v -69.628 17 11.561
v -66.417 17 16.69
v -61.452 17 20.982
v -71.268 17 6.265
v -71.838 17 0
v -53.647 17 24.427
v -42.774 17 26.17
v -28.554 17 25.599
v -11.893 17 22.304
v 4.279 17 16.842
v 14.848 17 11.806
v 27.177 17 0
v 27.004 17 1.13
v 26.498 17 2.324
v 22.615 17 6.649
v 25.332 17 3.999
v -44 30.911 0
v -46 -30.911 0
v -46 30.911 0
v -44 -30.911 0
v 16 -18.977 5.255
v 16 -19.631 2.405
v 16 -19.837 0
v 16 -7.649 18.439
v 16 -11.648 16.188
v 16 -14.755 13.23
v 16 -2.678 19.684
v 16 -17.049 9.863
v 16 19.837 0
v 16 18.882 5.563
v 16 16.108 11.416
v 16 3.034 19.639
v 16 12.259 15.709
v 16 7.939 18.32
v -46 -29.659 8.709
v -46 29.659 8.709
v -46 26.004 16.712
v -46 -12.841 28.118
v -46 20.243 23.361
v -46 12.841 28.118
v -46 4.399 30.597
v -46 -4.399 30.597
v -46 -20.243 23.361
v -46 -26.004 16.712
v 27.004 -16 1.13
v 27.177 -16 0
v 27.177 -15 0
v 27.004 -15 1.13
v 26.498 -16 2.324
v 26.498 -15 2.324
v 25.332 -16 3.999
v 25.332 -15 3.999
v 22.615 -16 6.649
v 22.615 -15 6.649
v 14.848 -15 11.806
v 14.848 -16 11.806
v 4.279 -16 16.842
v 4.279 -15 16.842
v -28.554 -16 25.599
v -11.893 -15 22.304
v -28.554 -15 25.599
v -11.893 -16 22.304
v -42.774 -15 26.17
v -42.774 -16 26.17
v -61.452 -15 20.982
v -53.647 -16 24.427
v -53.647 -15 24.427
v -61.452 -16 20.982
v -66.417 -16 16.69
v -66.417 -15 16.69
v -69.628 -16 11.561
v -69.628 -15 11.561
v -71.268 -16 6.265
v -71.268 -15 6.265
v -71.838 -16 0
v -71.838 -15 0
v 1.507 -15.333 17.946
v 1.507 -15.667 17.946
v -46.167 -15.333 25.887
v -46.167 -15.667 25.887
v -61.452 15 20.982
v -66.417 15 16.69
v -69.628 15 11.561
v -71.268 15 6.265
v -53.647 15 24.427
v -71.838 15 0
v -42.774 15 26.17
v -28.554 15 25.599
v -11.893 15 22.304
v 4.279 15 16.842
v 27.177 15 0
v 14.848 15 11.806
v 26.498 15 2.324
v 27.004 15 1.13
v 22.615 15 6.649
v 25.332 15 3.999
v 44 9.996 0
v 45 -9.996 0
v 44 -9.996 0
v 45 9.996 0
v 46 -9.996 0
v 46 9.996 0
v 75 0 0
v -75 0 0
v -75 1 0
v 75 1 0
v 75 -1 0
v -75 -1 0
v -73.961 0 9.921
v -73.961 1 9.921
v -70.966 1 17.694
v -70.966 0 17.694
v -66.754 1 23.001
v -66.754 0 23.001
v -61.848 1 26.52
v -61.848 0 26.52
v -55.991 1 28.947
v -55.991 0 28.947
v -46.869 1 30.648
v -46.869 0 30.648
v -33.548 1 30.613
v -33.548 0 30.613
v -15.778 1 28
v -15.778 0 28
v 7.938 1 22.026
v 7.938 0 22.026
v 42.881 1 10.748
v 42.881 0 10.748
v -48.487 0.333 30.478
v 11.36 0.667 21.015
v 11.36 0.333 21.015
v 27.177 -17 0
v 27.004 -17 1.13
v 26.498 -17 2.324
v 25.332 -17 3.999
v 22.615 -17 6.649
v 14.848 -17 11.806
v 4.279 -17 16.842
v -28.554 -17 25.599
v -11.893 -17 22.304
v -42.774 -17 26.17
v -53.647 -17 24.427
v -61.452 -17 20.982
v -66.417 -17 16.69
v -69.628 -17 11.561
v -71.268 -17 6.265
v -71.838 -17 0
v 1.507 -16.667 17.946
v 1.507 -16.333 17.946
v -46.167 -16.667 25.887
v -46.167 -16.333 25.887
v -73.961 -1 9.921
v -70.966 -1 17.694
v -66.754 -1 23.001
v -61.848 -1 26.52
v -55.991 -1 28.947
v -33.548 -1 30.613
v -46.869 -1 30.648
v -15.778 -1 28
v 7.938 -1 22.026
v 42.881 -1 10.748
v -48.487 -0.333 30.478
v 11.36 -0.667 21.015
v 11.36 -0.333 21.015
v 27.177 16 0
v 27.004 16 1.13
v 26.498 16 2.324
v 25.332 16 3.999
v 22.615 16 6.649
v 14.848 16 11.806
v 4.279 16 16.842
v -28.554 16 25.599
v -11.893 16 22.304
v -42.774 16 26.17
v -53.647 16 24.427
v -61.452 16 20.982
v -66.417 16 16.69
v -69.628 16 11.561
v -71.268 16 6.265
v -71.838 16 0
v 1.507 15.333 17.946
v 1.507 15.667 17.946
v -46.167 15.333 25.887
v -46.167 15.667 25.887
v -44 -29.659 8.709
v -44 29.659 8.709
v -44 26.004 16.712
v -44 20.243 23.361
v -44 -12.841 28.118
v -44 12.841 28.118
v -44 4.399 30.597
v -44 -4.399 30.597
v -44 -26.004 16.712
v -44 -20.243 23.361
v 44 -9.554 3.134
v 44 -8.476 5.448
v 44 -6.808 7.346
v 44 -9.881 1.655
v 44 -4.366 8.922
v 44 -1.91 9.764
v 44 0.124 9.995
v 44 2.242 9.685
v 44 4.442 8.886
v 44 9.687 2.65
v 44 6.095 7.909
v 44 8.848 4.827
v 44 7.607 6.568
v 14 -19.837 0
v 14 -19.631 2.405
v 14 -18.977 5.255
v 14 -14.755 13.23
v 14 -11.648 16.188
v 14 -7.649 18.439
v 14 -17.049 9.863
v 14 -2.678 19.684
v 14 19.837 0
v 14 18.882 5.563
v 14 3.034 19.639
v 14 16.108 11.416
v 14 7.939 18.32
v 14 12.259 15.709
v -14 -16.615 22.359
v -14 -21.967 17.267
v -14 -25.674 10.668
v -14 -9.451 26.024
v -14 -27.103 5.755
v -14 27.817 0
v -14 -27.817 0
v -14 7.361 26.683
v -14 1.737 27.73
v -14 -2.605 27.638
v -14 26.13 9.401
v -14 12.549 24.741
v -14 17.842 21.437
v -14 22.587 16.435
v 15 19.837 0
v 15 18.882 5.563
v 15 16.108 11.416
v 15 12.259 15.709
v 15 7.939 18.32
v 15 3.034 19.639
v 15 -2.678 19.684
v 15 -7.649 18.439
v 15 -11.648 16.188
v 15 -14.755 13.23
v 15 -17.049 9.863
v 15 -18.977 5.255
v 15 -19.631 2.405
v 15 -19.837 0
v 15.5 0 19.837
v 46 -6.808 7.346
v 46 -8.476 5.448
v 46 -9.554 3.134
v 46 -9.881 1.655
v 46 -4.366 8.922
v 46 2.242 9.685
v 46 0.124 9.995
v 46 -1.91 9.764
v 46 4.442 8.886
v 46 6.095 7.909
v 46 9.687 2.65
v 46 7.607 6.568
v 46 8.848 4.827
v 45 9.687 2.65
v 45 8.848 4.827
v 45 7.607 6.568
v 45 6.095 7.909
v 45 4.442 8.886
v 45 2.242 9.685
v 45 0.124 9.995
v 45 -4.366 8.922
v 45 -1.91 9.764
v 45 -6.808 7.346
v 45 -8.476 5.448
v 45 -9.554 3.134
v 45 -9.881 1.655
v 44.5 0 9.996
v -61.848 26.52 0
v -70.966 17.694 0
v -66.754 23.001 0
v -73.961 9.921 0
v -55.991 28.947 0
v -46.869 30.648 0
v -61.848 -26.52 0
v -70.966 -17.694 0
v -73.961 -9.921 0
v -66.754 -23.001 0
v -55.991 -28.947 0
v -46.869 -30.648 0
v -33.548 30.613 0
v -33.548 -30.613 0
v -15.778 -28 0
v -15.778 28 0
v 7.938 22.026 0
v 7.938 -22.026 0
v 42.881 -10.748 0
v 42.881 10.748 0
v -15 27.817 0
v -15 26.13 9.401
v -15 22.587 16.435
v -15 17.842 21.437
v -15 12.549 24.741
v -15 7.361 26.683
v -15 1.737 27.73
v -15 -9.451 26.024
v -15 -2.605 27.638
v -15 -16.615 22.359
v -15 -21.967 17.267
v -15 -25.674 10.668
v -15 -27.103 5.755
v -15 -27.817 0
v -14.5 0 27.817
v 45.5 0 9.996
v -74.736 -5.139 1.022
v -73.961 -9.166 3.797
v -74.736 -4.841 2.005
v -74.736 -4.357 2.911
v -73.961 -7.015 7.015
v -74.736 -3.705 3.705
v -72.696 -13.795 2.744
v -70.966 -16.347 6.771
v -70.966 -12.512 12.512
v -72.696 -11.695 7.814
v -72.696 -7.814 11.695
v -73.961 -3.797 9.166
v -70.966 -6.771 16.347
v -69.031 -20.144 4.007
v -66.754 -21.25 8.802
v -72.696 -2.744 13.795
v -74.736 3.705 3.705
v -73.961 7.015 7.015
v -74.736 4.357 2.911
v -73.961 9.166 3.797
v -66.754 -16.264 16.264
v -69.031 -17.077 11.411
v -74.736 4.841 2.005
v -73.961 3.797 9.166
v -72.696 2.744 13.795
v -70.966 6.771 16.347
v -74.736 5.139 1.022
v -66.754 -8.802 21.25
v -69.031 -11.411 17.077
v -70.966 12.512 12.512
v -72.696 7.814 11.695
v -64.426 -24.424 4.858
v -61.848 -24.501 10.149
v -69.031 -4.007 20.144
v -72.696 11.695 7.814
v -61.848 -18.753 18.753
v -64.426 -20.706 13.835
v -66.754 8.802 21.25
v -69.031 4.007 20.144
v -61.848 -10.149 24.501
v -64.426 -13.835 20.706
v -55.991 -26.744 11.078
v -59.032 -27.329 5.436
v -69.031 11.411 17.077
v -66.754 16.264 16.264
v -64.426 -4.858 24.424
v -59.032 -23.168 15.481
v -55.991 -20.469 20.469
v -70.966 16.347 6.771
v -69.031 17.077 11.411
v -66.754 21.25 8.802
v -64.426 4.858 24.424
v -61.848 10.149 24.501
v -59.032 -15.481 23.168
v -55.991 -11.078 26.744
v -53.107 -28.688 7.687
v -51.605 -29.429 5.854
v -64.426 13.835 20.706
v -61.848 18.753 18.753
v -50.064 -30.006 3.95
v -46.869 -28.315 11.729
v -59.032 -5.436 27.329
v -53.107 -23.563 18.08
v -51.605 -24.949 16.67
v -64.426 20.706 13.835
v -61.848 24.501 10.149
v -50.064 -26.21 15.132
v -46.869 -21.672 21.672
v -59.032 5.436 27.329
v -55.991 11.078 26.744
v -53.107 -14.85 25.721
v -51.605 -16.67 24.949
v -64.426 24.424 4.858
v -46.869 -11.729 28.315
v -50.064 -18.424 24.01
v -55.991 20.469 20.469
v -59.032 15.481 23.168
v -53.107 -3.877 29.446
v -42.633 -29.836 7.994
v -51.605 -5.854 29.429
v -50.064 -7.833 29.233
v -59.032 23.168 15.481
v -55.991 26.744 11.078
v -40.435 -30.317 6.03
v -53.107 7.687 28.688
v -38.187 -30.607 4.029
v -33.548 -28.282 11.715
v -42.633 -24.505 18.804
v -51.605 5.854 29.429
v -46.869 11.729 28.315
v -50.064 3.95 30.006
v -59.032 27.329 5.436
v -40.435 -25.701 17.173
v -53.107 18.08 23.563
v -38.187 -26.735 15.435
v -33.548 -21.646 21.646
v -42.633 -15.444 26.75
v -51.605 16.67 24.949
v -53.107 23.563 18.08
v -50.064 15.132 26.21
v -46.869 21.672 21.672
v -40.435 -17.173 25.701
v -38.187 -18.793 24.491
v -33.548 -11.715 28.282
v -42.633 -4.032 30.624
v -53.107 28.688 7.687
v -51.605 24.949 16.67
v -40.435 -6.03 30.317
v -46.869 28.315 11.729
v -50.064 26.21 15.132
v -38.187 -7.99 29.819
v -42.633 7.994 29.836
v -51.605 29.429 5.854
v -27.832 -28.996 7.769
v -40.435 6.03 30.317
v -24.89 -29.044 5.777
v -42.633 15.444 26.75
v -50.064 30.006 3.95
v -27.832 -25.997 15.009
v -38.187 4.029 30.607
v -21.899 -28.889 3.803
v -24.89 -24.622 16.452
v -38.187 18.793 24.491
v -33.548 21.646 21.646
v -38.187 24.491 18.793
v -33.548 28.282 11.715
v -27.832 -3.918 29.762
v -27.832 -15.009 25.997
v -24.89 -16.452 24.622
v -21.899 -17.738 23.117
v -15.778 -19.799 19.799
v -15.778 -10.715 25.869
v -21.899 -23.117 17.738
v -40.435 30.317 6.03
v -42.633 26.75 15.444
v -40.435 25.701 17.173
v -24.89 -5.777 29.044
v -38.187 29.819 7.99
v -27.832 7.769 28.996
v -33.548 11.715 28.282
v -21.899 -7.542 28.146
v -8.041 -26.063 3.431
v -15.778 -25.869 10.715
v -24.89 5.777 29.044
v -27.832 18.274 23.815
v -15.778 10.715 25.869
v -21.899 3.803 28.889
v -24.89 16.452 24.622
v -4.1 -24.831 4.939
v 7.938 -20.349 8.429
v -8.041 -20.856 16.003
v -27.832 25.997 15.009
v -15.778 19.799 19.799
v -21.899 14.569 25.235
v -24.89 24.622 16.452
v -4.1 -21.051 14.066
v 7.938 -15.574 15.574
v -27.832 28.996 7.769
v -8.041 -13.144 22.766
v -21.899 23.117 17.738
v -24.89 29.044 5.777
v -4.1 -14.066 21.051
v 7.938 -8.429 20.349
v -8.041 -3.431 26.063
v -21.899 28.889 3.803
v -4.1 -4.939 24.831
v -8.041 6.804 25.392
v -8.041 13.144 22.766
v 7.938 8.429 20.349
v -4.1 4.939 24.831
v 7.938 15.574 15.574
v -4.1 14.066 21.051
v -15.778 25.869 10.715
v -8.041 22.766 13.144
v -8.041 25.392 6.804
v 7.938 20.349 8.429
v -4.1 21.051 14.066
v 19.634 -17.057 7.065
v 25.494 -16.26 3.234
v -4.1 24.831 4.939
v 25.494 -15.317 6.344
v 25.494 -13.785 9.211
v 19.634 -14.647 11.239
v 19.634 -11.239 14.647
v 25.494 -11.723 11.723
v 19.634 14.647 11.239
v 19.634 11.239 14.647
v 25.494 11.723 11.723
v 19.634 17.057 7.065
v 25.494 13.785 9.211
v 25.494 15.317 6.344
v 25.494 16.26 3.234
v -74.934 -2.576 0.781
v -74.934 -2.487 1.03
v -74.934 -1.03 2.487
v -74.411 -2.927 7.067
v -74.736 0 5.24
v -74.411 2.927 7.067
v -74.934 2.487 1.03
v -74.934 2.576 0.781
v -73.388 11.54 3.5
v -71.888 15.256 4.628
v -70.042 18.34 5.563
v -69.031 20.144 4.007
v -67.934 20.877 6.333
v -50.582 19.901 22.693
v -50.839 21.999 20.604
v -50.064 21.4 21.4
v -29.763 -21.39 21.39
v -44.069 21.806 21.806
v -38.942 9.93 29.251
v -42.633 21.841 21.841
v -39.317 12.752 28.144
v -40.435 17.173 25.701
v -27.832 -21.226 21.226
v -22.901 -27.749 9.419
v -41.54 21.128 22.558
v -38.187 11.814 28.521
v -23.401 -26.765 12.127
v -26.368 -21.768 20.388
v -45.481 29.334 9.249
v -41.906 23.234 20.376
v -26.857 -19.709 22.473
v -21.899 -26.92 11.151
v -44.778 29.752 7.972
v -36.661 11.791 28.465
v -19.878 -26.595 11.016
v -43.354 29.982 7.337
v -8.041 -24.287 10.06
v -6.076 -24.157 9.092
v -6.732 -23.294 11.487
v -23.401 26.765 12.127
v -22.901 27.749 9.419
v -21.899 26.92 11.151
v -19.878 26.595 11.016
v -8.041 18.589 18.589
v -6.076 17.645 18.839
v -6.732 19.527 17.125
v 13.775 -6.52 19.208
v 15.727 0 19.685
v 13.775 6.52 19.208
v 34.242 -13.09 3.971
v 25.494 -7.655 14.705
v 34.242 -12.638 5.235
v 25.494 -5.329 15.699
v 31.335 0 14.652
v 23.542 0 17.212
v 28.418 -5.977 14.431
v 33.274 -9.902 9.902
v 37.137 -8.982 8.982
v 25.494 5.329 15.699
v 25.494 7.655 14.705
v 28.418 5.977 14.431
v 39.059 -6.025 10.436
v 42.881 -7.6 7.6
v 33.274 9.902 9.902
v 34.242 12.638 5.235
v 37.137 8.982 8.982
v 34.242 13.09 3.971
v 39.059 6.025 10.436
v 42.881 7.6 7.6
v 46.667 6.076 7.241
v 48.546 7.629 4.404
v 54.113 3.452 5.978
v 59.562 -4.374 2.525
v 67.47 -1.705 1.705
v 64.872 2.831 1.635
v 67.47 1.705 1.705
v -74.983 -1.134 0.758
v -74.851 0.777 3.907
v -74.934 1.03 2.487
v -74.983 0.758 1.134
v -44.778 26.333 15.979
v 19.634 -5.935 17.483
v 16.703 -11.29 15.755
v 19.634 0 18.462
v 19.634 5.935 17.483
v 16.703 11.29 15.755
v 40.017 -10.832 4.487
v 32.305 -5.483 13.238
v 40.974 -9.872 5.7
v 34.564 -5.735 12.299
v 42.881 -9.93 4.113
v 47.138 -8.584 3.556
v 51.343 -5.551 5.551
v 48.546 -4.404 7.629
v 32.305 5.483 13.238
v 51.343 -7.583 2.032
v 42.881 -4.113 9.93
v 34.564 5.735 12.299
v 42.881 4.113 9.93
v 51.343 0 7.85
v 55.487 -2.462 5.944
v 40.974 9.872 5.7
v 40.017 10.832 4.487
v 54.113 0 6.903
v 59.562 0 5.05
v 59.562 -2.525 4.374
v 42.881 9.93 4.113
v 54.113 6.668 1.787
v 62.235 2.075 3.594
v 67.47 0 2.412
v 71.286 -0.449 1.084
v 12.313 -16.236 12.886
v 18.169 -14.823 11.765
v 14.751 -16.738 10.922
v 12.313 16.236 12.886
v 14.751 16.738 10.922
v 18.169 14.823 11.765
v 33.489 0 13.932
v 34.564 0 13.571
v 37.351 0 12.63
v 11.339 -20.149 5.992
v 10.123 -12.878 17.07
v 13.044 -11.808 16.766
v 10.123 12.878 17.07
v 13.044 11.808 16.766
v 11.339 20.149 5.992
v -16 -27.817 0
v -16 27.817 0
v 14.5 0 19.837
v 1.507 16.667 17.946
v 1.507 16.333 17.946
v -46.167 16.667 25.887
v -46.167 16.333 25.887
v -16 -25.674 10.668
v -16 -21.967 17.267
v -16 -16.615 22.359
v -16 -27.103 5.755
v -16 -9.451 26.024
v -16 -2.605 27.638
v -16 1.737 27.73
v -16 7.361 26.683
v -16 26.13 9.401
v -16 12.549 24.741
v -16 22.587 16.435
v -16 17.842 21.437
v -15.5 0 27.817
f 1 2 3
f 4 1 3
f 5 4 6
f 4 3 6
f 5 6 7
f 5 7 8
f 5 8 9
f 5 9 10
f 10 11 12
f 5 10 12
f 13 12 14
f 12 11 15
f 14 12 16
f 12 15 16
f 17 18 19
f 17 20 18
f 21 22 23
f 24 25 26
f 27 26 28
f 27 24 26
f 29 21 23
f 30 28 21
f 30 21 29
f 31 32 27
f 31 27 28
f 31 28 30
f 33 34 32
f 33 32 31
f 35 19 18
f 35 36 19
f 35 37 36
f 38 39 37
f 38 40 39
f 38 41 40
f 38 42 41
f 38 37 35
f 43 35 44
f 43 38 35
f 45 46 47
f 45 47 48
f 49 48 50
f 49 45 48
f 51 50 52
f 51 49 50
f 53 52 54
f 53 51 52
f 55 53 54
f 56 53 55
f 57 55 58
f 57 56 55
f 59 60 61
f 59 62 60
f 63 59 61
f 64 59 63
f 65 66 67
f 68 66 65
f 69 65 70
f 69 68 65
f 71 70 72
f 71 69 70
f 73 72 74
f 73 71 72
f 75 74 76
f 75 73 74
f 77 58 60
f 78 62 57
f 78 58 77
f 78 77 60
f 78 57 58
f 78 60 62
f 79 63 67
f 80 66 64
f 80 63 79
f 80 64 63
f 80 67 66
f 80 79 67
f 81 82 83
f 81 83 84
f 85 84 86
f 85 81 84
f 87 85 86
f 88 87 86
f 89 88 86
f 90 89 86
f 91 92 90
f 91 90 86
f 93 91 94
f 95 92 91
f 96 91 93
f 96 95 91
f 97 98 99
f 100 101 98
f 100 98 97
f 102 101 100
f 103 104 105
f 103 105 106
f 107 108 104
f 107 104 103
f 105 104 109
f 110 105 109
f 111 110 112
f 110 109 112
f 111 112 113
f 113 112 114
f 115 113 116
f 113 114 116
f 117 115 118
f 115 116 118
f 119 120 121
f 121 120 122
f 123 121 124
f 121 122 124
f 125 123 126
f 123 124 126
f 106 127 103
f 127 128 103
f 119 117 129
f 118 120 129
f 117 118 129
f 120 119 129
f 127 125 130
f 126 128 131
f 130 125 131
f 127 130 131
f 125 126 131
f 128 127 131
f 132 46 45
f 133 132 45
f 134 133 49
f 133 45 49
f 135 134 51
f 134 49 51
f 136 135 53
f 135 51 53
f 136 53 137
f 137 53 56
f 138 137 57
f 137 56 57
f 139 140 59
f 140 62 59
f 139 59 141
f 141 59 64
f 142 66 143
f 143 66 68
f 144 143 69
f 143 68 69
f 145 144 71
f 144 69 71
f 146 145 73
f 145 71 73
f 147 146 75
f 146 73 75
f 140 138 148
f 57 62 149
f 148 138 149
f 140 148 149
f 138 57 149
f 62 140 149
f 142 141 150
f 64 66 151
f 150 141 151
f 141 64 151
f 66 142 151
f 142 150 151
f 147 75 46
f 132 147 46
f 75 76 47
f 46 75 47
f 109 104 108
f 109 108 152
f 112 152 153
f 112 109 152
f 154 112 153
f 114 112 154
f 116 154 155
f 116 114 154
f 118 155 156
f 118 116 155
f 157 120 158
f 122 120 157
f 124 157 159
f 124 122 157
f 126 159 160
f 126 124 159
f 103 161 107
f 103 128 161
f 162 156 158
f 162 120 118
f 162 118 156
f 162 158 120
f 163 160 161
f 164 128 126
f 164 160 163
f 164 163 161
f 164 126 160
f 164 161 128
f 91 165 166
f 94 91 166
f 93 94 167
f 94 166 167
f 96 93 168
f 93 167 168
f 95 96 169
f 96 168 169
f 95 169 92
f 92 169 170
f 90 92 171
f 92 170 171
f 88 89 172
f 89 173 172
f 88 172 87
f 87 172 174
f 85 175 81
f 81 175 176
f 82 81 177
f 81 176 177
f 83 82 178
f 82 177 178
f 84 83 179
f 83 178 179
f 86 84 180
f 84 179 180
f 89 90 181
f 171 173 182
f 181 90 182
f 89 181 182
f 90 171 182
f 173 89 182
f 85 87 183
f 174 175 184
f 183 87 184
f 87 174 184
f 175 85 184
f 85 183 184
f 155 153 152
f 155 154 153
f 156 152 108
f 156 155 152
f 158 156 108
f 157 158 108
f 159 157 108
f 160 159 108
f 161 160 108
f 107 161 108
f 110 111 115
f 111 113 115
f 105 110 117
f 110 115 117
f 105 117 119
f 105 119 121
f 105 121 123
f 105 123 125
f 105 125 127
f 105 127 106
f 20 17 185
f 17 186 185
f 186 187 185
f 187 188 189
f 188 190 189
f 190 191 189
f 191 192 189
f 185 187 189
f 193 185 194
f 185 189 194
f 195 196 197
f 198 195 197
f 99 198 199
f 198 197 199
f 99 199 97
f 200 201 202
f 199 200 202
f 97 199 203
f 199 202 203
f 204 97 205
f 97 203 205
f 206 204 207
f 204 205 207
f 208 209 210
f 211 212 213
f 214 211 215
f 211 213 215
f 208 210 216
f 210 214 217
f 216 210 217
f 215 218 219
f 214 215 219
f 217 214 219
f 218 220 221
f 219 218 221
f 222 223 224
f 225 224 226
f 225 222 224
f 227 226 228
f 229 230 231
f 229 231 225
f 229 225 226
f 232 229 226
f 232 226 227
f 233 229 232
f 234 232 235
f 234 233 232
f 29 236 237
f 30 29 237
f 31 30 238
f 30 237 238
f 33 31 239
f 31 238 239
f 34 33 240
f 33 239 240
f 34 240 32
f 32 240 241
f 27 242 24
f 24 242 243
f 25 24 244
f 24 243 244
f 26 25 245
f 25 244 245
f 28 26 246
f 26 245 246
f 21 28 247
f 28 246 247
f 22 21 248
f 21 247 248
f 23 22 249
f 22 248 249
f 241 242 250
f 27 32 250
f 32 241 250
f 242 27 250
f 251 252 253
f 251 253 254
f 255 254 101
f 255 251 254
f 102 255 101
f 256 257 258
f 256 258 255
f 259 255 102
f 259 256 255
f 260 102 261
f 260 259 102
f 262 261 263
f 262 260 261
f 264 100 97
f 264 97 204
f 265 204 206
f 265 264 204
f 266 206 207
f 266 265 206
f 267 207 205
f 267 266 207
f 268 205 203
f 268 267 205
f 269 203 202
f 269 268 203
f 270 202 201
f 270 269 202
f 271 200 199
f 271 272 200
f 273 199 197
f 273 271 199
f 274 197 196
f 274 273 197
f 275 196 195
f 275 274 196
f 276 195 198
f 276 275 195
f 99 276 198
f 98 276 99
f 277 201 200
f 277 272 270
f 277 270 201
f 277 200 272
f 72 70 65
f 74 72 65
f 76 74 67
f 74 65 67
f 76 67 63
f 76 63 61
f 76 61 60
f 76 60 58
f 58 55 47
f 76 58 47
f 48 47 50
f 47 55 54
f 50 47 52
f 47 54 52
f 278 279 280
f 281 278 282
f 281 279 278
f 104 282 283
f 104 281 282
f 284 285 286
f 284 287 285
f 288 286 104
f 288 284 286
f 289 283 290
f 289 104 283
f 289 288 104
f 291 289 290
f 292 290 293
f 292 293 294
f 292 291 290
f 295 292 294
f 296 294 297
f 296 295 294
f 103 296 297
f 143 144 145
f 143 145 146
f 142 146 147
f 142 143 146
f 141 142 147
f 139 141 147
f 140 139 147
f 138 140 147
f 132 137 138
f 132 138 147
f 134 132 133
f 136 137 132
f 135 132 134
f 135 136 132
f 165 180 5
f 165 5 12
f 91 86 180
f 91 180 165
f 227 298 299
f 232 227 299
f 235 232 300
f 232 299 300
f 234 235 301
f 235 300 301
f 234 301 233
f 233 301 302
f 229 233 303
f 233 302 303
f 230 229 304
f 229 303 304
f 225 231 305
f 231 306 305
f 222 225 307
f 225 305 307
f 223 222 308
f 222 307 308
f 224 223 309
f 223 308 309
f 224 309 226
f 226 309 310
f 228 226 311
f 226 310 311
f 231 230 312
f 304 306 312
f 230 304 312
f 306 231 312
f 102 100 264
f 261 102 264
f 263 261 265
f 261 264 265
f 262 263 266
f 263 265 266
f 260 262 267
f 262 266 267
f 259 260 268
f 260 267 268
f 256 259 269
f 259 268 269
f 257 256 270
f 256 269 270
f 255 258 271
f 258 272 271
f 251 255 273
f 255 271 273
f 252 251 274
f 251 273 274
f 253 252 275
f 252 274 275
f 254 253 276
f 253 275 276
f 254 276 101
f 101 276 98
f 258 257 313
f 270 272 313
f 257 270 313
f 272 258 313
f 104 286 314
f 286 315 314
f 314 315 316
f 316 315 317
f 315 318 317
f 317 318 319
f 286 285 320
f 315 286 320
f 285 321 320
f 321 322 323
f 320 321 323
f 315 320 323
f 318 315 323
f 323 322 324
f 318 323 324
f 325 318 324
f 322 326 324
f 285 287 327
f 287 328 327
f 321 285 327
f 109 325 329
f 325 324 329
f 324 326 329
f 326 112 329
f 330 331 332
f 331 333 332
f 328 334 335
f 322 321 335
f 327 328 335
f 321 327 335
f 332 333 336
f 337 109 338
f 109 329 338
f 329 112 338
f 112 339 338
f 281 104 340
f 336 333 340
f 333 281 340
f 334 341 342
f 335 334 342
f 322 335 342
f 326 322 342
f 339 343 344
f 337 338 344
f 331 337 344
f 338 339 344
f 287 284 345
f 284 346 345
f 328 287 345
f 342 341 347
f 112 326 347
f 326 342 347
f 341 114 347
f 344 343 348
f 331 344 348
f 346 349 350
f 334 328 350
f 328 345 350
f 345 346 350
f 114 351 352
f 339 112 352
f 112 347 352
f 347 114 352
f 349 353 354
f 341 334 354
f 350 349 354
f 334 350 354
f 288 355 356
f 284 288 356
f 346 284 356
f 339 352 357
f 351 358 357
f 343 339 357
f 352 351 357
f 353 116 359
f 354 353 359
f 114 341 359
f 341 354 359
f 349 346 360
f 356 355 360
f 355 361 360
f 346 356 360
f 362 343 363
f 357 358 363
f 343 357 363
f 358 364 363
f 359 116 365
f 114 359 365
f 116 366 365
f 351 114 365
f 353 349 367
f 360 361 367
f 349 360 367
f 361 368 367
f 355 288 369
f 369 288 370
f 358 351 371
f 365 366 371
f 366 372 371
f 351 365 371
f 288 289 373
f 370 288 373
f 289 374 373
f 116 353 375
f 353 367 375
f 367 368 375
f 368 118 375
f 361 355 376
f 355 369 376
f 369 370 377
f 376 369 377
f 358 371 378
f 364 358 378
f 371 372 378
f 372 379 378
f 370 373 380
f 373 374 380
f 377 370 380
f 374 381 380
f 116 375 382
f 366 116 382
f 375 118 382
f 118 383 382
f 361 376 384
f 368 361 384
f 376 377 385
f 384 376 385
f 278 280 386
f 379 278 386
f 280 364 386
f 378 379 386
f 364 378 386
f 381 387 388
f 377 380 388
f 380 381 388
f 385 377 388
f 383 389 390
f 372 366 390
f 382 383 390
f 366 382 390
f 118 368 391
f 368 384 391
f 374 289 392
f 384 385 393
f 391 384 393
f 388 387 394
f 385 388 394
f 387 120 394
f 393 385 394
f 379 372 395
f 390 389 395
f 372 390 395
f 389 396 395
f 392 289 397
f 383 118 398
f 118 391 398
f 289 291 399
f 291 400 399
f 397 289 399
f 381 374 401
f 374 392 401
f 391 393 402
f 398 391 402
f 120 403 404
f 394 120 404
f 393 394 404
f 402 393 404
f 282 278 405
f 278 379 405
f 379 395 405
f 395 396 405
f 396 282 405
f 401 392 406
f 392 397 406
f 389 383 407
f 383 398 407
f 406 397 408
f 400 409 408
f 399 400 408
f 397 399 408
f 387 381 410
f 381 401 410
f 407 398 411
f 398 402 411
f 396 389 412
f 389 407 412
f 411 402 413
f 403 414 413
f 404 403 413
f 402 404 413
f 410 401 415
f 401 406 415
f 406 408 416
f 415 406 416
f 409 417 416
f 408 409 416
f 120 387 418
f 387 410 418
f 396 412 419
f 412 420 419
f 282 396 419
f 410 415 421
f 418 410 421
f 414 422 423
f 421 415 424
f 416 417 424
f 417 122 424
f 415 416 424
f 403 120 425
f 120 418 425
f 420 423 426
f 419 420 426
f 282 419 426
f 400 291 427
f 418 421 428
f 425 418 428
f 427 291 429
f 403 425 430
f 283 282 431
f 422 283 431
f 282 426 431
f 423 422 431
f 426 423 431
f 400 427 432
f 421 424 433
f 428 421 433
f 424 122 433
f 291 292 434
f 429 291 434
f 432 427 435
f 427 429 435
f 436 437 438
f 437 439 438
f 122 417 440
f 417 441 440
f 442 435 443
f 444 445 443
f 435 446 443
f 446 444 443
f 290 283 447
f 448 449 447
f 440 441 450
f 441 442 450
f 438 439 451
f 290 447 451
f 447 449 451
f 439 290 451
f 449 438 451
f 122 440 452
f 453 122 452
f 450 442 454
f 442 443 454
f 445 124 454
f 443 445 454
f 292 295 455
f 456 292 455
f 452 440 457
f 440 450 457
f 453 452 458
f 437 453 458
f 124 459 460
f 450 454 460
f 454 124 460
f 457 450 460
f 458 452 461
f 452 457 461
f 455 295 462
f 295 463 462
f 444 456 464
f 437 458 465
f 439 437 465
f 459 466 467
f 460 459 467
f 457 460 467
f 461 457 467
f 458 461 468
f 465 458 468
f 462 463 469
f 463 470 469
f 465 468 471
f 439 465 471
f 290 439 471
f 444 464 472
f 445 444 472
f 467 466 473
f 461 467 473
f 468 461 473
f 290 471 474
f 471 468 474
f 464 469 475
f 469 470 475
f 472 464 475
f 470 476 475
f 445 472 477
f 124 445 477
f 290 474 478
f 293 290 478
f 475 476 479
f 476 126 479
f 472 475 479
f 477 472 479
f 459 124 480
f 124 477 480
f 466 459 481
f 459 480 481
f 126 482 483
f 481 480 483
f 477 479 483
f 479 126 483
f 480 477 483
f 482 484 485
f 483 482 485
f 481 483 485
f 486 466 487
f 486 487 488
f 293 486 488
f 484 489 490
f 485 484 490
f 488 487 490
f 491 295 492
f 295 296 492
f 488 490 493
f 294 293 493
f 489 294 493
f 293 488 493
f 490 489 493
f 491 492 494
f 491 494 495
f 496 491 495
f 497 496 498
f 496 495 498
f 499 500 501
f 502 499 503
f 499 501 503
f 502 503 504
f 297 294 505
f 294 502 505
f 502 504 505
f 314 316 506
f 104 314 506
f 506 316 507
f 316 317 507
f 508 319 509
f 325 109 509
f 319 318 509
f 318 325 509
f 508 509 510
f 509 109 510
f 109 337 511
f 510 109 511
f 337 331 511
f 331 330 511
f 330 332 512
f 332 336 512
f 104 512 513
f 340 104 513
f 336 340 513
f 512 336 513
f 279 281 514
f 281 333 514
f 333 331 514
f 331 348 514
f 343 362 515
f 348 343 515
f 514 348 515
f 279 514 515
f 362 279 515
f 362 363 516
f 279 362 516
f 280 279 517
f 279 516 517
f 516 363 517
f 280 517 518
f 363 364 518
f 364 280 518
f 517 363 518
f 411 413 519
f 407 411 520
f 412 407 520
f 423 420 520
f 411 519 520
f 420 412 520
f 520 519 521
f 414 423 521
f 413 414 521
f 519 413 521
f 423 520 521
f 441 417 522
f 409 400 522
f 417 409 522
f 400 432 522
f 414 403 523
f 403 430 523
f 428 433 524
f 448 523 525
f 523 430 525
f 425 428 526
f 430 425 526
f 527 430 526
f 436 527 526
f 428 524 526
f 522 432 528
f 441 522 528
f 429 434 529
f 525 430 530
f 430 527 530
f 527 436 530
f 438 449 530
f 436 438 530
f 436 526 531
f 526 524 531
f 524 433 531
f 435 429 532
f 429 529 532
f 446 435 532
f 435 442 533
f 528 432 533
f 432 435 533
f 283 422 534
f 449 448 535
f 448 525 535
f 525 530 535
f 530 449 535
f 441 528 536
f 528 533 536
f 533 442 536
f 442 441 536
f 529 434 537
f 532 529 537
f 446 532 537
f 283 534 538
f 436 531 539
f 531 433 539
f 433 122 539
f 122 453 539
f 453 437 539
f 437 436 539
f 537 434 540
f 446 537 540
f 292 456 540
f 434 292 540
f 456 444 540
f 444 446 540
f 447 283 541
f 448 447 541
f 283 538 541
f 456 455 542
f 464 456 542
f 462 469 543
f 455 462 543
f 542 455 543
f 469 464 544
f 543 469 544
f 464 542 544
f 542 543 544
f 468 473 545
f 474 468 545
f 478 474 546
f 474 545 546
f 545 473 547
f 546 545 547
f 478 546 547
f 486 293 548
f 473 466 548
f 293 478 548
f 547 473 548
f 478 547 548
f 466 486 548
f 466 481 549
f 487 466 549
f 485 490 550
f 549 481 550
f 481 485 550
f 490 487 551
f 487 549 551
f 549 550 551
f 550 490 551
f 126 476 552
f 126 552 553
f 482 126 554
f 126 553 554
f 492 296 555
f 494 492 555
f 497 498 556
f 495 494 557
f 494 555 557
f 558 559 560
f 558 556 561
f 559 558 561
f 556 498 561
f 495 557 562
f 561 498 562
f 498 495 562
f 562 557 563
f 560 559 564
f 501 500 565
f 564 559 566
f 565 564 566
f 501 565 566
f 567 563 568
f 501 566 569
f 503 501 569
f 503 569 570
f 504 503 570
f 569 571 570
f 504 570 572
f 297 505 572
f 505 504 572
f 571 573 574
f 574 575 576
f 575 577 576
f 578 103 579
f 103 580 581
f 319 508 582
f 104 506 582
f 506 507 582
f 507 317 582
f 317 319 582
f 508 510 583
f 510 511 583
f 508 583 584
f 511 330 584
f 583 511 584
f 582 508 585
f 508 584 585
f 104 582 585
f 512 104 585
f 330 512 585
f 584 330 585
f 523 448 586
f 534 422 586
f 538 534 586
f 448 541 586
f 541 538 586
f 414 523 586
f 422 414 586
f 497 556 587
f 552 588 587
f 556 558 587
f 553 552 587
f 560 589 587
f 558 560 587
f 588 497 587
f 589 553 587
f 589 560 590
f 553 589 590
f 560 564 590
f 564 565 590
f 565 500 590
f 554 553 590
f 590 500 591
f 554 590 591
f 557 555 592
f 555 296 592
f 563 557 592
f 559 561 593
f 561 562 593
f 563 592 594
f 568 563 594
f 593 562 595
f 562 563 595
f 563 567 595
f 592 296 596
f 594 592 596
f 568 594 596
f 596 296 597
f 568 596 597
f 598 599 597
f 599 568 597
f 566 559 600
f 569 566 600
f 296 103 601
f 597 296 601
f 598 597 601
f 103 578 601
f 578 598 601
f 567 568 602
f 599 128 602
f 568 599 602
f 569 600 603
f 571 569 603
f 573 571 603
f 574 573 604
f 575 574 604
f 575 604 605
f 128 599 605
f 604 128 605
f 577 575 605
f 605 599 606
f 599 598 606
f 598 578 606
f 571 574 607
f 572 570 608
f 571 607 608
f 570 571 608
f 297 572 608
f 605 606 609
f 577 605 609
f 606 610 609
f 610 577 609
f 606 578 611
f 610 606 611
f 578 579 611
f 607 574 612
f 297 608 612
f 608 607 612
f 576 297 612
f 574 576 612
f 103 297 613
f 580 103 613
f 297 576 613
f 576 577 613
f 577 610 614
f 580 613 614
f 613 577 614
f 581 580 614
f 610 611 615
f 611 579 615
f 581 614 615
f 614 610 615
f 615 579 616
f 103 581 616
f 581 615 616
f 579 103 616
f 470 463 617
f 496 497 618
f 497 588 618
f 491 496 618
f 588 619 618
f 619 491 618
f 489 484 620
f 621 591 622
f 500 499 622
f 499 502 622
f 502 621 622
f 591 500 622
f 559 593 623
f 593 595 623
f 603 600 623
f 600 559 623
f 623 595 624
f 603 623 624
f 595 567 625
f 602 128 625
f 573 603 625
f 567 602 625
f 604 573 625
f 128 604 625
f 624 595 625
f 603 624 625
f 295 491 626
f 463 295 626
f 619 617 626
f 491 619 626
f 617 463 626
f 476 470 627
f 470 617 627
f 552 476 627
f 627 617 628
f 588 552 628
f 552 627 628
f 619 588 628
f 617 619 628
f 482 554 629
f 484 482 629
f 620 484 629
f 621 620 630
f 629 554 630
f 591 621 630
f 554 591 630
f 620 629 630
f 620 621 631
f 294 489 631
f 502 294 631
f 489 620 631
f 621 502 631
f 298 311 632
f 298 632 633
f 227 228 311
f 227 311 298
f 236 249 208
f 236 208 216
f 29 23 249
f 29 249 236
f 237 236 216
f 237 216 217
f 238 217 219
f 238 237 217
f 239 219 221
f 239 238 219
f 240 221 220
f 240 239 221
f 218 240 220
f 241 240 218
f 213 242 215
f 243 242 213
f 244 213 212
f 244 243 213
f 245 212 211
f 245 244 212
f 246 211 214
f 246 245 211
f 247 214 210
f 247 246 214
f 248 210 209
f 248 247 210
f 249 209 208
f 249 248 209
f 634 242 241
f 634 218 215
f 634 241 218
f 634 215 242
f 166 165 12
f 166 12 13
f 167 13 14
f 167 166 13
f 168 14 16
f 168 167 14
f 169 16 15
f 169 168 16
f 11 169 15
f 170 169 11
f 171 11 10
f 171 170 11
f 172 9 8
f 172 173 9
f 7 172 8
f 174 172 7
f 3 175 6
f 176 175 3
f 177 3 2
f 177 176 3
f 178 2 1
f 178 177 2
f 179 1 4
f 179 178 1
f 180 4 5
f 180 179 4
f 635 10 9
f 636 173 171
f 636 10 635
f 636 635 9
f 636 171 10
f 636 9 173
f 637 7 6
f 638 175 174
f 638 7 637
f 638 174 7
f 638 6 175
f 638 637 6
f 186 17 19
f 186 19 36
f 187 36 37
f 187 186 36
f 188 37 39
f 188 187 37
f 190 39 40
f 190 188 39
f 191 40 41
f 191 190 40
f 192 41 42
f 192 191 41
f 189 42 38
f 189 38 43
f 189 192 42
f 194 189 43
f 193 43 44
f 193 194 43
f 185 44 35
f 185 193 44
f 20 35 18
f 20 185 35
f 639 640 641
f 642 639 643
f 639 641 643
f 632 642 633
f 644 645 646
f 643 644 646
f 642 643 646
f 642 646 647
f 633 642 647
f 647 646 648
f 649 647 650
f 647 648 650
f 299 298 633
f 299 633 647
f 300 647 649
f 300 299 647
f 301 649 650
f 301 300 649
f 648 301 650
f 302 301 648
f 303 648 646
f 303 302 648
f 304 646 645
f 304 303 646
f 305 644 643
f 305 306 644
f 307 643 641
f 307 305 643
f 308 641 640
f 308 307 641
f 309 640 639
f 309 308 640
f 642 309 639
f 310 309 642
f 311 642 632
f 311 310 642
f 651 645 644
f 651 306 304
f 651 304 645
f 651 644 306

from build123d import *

# Parameters (mm, degrees)
F1_ANGLE_BACK = 90
F1_ANGLE      = 180
F11_DEPTH     = 1
F12_DEPTH     = 1
F13_DEPTH     = 1
F16_DEPTH     = 1


# Not quite as in the source:
# - ends of sketch curves that miss each other by under 0.0002 mm in the source are joined


with BuildPart() as f1:
    # F0 (on Front) → F1 (revolve)
    with BuildSketch(Plane.XZ, mode=Mode.PRIVATE) as f1_sk:
        with BuildLine():
            Line((-75, 0), (0, 0))
            Line((0, 0), (75, 0))
            add(Edge.make_bspline(
                [(-75, 0), (-75, 59.9126815796), (19.3098373711, 17.3266641796), (75, 0)],
                knots=[0, 0, 0, 0, 150, 150, 150, 150], degree=3))
        make_face()
    revolve(f1_sk.sketch.rotate(Axis((-37.5, 0, 0), (-1, 0, 0)), -F1_ANGLE_BACK), axis=Axis((-37.5, 0, 0), (-1, 0, 0)), revolution_arc=F1_ANGLE)


with BuildPart() as f11:
    # F7 (on offset) → F11 (new body, symmetric)
    with BuildSketch(Plane.YZ.offset(-45)):
        with BuildLine():
            add(Edge.make_bspline(
                [(0, 0), (-10.3037776914, 0), (-20.6075553827, 0), (-30.9113330741, 0)],
                knots=[0, 0, 0, 0, 1, 1, 1, 1], degree=3))
            add(Edge.make_bspline(
                [(0, 0), (10.3037776914, 0), (20.6075553827, 0), (30.9113330741, 0)],
                knots=[0, 0, 0, 0, 1, 1, 1, 1], degree=3))
            ThreePointArc((30.9113330741, 0), (0, 30.9113368971), (-30.9113330741, 0))
        make_face()
    extrude(amount=F11_DEPTH, both=True)


with BuildPart() as f12:
    # F8 (on offset) → F12 (new body, symmetric)
    with BuildSketch(Plane.YZ.offset(-15)):
        with BuildLine():
            Line((-27.8169345111, 0), (0, 0))
            Line((0, 0), (27.8169345111, 0))
            add(Edge.make_bspline(
                [(0, 27.8169102967), (5.0467201509, 27.8169102967), (26.5604257584, 24.8144250363), (27.8169345111, 0)],
                knots=[0, 0, 0, 0, 39.339068927, 39.339068927, 39.339068927, 39.339068927], degree=3))
            add(Edge.make_bspline(
                [(0, 27.8169102967), (-5.0467201509, 27.8169102967), (-26.5604257584, 24.8144250363), (-27.8169345111, 0)],
                knots=[0, 0, 0, 0, 39.339068927, 39.339068927, 39.339068927, 39.339068927], degree=3))
        make_face()
    extrude(amount=F12_DEPTH, both=True)


with BuildPart() as f12b:
    # F9 (on offset) → F12, piece 2 (new body, symmetric)
    with BuildSketch(Plane.YZ.offset(15)):
        with BuildLine():
            Line((-19.8365133256, 0), (0, 0))
            Line((0, 0), (19.8365133256, 0))
            add(Edge.make_bspline(
                [(19.8365133256, 0), (19.8365133256, 5.9684109874), (15.1341622695, 19.8365263641), (0, 19.8365263641)],
                knots=[0, 0, 0, 0, 28.0530753948, 28.0530753948, 28.0530753948, 28.0530753948], degree=3))
            add(Edge.make_bspline(
                [(-19.8365133256, 0), (-19.8365133256, 5.9684109874), (-15.1341622695, 19.8365263641), (0, 19.8365263641)],
                knots=[0, 0, 0, 0, 28.0530753948, 28.0530753948, 28.0530753948, 28.0530753948], degree=3))
        make_face()
    extrude(amount=F12_DEPTH, both=True)


with BuildPart() as f12c:
    # F10 (on offset) → F12, piece 3 (new body, symmetric)
    with BuildSketch(Plane.YZ.offset(45)):
        with BuildLine():
            Line((-9.9959000945, 0), (0, 0))
            Line((0, 0), (9.9959000945, 0))
            add(Edge.make_bspline(
                [(0, 9.9958991632), (3.0557271093, 9.9958991632), (9.9959000945, 7.6686600223), (9.9959000945, 0)],
                knots=[0, 0, 0, 0, 14.1363368232, 14.1363368232, 14.1363368232, 14.1363368232], degree=3))
            add(Edge.make_bspline(
                [(0, 9.9958991632), (-3.0557271093, 9.9958991632), (-9.9959000945, 7.6686600223), (-9.9959000945, 0)],
                knots=[0, 0, 0, 0, 14.1363368232, 14.1363368232, 14.1363368232, 14.1363368232], degree=3))
        make_face()
    extrude(amount=F12_DEPTH, both=True)


with BuildPart() as f13:
    # F0 (on Front) → F13 (new body, symmetric)
    with BuildSketch(Plane.XZ):
        with BuildLine():
            Line((-75, 0), (0, 0))
            Line((0, 0), (75, 0))
            add(Edge.make_bspline(
                [(-75, 0), (-75, 59.9126815796), (19.3098373711, 17.3266641796), (75, 0)],
                knots=[0, 0, 0, 0, 150, 150, 150, 150], degree=3))
        make_face()
    extrude(amount=F13_DEPTH, both=True)


with BuildPart() as f16:
    # F15 (on offset) → F16 (new body, symmetric)
    with BuildSketch(Plane.XZ.offset(-16)):
        with BuildLine():
            Line((-71.8375742435, 0), (27.1770562977, 0))
            add(Edge.make_bspline(
                [(27.1770562977, 0), (27.1770562977, 15.0069938973), (-71.8375742435, 50.7412180305), (-71.8375742435, 0)],
                knots=[0, 0, 0, 0, 99.0146305412, 99.0146305412, 99.0146305412, 99.0146305412], degree=3))
        make_face()
    extrude(amount=F16_DEPTH, both=True)


with BuildPart() as f17_1:
    # F17: instance of F16
    add(f16.part.mirror(Plane.XZ))


solid = Compound([f1.part, f11.part, f12.part, f12b.part, f12c.part, f13.part, f16.part, f17_1.part])
